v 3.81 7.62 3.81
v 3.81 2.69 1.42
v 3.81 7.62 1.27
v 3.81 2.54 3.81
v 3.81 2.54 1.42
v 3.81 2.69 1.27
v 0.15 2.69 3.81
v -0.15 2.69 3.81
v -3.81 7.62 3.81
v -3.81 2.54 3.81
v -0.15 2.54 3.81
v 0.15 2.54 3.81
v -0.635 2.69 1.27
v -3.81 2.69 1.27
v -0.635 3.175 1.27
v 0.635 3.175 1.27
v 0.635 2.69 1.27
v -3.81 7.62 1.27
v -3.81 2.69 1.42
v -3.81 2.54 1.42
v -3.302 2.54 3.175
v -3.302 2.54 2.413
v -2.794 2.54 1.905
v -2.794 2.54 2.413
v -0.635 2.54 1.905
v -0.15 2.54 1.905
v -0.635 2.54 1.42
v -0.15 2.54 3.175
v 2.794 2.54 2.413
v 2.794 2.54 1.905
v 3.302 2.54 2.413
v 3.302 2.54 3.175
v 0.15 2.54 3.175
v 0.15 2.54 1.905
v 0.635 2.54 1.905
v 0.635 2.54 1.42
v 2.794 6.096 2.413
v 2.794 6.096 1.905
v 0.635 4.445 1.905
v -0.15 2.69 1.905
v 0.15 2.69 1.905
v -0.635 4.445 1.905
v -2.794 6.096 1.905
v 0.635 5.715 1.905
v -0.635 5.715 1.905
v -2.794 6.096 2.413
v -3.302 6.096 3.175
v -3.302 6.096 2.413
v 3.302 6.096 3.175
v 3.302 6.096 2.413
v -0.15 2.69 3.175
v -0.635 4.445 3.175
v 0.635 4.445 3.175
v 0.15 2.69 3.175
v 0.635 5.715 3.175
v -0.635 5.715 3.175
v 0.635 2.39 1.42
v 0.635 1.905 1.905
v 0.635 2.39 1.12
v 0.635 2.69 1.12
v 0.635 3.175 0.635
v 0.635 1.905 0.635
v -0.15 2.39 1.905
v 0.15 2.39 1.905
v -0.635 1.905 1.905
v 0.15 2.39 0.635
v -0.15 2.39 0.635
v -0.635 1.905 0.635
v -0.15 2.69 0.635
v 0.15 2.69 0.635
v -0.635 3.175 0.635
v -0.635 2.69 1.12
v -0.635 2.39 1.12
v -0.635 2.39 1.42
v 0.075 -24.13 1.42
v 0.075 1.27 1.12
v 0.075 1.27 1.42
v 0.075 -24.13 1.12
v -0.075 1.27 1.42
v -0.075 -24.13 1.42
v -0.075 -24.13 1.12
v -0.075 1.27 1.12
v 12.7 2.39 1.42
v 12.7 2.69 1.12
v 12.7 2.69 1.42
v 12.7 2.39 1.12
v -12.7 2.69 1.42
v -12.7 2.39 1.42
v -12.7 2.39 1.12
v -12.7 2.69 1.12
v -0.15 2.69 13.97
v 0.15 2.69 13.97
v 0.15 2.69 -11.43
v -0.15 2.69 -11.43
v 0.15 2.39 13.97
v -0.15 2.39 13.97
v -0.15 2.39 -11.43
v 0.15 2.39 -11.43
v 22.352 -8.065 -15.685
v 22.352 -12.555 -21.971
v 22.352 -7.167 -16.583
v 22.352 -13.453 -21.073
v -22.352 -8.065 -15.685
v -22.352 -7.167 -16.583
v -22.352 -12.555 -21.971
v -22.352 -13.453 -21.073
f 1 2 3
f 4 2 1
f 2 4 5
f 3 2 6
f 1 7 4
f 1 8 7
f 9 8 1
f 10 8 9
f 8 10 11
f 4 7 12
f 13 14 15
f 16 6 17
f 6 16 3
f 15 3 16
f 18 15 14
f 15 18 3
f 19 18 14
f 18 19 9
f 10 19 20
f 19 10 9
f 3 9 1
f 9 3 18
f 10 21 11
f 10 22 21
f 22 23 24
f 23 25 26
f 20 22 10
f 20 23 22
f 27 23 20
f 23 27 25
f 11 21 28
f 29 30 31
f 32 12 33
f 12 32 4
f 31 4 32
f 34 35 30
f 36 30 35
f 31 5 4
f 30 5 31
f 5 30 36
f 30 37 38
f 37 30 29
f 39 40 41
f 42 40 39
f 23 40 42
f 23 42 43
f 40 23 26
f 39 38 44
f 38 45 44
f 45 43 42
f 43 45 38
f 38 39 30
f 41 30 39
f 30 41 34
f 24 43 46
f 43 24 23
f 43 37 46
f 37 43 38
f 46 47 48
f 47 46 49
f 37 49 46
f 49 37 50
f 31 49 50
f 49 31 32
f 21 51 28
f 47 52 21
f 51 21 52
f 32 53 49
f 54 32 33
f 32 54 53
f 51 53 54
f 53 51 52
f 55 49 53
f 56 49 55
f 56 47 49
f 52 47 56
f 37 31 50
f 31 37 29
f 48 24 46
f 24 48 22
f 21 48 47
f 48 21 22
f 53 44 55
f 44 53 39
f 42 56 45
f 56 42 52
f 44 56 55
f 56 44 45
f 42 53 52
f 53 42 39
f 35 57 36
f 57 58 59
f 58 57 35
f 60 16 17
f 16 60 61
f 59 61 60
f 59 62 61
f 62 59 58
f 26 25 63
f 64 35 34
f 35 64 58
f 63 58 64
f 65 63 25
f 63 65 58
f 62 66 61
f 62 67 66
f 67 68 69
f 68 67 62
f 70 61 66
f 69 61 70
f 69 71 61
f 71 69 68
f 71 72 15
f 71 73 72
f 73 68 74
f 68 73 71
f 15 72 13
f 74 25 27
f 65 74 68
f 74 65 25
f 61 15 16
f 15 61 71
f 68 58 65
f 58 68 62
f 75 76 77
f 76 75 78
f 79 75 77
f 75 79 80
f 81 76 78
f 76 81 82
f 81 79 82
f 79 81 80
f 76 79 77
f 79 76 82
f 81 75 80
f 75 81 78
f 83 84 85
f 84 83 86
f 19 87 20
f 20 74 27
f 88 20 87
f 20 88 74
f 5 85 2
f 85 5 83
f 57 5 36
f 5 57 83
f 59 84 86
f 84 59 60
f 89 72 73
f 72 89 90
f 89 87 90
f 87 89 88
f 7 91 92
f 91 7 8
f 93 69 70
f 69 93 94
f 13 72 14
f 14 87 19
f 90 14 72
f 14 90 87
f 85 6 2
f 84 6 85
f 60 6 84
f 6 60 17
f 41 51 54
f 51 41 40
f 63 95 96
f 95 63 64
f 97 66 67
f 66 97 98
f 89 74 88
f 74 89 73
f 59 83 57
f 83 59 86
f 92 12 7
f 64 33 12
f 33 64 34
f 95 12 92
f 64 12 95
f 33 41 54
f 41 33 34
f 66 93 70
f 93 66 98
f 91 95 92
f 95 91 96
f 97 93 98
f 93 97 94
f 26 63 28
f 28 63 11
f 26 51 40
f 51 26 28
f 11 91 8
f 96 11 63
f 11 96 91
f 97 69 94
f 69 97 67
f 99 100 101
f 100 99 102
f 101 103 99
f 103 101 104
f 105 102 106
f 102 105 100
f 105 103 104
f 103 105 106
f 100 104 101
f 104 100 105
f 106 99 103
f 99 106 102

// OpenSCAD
include <../mo/mo.scad>

moMicroUSB_Height = 0.2 * in;
moMicroUSB_Width = 0.3 * in;
moMicroUSB_Depth = 0.1 * in;
moMicroUSB_Wall = 0.02 * in;

positions = [ 
  [ [ 0, 0, 0 ], [ 0, 0, 1 ], 0 ],
  [ [ 0, -moMicroUSB_Height/2, -moMicroUSB_Depth/2 ], [ 1, 0, 0 ], 0 ]
];

module moMicroUSB( p = 0, info = false, name = false ) {
  moPresent( positions, p, info ) {
    // USB Connector
      color( Aluminum ) {
        difference() {
          cube( [ moMicroUSB_Width, moMicroUSB_Height, moMicroUSB_Depth ], center = true );
          translate( [ 0, -2 * moMicroUSB_Wall, -moMicroUSB_Wall/ 2] )
            cube( [ moMicroUSB_Width - 4 * moMicroUSB_Wall, 
                  moMicroUSB_Height - 2 * moMicroUSB_Wall, 
                  ( moMicroUSB_Depth - 2 * moMicroUSB_Wall ) / 2 ], center = true );
          translate( [ 0, -2 * moMicroUSB_Wall, moMicroUSB_Wall / 2 ] )
            cube( [ moMicroUSB_Width - 2 * moMicroUSB_Wall, 
                  moMicroUSB_Height - 2 * moMicroUSB_Wall, 
                  ( moMicroUSB_Depth - 2 * moMicroUSB_Wall ) / 2 ], center = true );
        
        }
      }
    
  }
}


function moMicroUSBPosition( p = 0 ) = positions[ p ];

moMoveOriginTo(moMicroUSBPosition( 1 ) ) {
  moMicroUSB( 1, info = true, $name = true );
}
